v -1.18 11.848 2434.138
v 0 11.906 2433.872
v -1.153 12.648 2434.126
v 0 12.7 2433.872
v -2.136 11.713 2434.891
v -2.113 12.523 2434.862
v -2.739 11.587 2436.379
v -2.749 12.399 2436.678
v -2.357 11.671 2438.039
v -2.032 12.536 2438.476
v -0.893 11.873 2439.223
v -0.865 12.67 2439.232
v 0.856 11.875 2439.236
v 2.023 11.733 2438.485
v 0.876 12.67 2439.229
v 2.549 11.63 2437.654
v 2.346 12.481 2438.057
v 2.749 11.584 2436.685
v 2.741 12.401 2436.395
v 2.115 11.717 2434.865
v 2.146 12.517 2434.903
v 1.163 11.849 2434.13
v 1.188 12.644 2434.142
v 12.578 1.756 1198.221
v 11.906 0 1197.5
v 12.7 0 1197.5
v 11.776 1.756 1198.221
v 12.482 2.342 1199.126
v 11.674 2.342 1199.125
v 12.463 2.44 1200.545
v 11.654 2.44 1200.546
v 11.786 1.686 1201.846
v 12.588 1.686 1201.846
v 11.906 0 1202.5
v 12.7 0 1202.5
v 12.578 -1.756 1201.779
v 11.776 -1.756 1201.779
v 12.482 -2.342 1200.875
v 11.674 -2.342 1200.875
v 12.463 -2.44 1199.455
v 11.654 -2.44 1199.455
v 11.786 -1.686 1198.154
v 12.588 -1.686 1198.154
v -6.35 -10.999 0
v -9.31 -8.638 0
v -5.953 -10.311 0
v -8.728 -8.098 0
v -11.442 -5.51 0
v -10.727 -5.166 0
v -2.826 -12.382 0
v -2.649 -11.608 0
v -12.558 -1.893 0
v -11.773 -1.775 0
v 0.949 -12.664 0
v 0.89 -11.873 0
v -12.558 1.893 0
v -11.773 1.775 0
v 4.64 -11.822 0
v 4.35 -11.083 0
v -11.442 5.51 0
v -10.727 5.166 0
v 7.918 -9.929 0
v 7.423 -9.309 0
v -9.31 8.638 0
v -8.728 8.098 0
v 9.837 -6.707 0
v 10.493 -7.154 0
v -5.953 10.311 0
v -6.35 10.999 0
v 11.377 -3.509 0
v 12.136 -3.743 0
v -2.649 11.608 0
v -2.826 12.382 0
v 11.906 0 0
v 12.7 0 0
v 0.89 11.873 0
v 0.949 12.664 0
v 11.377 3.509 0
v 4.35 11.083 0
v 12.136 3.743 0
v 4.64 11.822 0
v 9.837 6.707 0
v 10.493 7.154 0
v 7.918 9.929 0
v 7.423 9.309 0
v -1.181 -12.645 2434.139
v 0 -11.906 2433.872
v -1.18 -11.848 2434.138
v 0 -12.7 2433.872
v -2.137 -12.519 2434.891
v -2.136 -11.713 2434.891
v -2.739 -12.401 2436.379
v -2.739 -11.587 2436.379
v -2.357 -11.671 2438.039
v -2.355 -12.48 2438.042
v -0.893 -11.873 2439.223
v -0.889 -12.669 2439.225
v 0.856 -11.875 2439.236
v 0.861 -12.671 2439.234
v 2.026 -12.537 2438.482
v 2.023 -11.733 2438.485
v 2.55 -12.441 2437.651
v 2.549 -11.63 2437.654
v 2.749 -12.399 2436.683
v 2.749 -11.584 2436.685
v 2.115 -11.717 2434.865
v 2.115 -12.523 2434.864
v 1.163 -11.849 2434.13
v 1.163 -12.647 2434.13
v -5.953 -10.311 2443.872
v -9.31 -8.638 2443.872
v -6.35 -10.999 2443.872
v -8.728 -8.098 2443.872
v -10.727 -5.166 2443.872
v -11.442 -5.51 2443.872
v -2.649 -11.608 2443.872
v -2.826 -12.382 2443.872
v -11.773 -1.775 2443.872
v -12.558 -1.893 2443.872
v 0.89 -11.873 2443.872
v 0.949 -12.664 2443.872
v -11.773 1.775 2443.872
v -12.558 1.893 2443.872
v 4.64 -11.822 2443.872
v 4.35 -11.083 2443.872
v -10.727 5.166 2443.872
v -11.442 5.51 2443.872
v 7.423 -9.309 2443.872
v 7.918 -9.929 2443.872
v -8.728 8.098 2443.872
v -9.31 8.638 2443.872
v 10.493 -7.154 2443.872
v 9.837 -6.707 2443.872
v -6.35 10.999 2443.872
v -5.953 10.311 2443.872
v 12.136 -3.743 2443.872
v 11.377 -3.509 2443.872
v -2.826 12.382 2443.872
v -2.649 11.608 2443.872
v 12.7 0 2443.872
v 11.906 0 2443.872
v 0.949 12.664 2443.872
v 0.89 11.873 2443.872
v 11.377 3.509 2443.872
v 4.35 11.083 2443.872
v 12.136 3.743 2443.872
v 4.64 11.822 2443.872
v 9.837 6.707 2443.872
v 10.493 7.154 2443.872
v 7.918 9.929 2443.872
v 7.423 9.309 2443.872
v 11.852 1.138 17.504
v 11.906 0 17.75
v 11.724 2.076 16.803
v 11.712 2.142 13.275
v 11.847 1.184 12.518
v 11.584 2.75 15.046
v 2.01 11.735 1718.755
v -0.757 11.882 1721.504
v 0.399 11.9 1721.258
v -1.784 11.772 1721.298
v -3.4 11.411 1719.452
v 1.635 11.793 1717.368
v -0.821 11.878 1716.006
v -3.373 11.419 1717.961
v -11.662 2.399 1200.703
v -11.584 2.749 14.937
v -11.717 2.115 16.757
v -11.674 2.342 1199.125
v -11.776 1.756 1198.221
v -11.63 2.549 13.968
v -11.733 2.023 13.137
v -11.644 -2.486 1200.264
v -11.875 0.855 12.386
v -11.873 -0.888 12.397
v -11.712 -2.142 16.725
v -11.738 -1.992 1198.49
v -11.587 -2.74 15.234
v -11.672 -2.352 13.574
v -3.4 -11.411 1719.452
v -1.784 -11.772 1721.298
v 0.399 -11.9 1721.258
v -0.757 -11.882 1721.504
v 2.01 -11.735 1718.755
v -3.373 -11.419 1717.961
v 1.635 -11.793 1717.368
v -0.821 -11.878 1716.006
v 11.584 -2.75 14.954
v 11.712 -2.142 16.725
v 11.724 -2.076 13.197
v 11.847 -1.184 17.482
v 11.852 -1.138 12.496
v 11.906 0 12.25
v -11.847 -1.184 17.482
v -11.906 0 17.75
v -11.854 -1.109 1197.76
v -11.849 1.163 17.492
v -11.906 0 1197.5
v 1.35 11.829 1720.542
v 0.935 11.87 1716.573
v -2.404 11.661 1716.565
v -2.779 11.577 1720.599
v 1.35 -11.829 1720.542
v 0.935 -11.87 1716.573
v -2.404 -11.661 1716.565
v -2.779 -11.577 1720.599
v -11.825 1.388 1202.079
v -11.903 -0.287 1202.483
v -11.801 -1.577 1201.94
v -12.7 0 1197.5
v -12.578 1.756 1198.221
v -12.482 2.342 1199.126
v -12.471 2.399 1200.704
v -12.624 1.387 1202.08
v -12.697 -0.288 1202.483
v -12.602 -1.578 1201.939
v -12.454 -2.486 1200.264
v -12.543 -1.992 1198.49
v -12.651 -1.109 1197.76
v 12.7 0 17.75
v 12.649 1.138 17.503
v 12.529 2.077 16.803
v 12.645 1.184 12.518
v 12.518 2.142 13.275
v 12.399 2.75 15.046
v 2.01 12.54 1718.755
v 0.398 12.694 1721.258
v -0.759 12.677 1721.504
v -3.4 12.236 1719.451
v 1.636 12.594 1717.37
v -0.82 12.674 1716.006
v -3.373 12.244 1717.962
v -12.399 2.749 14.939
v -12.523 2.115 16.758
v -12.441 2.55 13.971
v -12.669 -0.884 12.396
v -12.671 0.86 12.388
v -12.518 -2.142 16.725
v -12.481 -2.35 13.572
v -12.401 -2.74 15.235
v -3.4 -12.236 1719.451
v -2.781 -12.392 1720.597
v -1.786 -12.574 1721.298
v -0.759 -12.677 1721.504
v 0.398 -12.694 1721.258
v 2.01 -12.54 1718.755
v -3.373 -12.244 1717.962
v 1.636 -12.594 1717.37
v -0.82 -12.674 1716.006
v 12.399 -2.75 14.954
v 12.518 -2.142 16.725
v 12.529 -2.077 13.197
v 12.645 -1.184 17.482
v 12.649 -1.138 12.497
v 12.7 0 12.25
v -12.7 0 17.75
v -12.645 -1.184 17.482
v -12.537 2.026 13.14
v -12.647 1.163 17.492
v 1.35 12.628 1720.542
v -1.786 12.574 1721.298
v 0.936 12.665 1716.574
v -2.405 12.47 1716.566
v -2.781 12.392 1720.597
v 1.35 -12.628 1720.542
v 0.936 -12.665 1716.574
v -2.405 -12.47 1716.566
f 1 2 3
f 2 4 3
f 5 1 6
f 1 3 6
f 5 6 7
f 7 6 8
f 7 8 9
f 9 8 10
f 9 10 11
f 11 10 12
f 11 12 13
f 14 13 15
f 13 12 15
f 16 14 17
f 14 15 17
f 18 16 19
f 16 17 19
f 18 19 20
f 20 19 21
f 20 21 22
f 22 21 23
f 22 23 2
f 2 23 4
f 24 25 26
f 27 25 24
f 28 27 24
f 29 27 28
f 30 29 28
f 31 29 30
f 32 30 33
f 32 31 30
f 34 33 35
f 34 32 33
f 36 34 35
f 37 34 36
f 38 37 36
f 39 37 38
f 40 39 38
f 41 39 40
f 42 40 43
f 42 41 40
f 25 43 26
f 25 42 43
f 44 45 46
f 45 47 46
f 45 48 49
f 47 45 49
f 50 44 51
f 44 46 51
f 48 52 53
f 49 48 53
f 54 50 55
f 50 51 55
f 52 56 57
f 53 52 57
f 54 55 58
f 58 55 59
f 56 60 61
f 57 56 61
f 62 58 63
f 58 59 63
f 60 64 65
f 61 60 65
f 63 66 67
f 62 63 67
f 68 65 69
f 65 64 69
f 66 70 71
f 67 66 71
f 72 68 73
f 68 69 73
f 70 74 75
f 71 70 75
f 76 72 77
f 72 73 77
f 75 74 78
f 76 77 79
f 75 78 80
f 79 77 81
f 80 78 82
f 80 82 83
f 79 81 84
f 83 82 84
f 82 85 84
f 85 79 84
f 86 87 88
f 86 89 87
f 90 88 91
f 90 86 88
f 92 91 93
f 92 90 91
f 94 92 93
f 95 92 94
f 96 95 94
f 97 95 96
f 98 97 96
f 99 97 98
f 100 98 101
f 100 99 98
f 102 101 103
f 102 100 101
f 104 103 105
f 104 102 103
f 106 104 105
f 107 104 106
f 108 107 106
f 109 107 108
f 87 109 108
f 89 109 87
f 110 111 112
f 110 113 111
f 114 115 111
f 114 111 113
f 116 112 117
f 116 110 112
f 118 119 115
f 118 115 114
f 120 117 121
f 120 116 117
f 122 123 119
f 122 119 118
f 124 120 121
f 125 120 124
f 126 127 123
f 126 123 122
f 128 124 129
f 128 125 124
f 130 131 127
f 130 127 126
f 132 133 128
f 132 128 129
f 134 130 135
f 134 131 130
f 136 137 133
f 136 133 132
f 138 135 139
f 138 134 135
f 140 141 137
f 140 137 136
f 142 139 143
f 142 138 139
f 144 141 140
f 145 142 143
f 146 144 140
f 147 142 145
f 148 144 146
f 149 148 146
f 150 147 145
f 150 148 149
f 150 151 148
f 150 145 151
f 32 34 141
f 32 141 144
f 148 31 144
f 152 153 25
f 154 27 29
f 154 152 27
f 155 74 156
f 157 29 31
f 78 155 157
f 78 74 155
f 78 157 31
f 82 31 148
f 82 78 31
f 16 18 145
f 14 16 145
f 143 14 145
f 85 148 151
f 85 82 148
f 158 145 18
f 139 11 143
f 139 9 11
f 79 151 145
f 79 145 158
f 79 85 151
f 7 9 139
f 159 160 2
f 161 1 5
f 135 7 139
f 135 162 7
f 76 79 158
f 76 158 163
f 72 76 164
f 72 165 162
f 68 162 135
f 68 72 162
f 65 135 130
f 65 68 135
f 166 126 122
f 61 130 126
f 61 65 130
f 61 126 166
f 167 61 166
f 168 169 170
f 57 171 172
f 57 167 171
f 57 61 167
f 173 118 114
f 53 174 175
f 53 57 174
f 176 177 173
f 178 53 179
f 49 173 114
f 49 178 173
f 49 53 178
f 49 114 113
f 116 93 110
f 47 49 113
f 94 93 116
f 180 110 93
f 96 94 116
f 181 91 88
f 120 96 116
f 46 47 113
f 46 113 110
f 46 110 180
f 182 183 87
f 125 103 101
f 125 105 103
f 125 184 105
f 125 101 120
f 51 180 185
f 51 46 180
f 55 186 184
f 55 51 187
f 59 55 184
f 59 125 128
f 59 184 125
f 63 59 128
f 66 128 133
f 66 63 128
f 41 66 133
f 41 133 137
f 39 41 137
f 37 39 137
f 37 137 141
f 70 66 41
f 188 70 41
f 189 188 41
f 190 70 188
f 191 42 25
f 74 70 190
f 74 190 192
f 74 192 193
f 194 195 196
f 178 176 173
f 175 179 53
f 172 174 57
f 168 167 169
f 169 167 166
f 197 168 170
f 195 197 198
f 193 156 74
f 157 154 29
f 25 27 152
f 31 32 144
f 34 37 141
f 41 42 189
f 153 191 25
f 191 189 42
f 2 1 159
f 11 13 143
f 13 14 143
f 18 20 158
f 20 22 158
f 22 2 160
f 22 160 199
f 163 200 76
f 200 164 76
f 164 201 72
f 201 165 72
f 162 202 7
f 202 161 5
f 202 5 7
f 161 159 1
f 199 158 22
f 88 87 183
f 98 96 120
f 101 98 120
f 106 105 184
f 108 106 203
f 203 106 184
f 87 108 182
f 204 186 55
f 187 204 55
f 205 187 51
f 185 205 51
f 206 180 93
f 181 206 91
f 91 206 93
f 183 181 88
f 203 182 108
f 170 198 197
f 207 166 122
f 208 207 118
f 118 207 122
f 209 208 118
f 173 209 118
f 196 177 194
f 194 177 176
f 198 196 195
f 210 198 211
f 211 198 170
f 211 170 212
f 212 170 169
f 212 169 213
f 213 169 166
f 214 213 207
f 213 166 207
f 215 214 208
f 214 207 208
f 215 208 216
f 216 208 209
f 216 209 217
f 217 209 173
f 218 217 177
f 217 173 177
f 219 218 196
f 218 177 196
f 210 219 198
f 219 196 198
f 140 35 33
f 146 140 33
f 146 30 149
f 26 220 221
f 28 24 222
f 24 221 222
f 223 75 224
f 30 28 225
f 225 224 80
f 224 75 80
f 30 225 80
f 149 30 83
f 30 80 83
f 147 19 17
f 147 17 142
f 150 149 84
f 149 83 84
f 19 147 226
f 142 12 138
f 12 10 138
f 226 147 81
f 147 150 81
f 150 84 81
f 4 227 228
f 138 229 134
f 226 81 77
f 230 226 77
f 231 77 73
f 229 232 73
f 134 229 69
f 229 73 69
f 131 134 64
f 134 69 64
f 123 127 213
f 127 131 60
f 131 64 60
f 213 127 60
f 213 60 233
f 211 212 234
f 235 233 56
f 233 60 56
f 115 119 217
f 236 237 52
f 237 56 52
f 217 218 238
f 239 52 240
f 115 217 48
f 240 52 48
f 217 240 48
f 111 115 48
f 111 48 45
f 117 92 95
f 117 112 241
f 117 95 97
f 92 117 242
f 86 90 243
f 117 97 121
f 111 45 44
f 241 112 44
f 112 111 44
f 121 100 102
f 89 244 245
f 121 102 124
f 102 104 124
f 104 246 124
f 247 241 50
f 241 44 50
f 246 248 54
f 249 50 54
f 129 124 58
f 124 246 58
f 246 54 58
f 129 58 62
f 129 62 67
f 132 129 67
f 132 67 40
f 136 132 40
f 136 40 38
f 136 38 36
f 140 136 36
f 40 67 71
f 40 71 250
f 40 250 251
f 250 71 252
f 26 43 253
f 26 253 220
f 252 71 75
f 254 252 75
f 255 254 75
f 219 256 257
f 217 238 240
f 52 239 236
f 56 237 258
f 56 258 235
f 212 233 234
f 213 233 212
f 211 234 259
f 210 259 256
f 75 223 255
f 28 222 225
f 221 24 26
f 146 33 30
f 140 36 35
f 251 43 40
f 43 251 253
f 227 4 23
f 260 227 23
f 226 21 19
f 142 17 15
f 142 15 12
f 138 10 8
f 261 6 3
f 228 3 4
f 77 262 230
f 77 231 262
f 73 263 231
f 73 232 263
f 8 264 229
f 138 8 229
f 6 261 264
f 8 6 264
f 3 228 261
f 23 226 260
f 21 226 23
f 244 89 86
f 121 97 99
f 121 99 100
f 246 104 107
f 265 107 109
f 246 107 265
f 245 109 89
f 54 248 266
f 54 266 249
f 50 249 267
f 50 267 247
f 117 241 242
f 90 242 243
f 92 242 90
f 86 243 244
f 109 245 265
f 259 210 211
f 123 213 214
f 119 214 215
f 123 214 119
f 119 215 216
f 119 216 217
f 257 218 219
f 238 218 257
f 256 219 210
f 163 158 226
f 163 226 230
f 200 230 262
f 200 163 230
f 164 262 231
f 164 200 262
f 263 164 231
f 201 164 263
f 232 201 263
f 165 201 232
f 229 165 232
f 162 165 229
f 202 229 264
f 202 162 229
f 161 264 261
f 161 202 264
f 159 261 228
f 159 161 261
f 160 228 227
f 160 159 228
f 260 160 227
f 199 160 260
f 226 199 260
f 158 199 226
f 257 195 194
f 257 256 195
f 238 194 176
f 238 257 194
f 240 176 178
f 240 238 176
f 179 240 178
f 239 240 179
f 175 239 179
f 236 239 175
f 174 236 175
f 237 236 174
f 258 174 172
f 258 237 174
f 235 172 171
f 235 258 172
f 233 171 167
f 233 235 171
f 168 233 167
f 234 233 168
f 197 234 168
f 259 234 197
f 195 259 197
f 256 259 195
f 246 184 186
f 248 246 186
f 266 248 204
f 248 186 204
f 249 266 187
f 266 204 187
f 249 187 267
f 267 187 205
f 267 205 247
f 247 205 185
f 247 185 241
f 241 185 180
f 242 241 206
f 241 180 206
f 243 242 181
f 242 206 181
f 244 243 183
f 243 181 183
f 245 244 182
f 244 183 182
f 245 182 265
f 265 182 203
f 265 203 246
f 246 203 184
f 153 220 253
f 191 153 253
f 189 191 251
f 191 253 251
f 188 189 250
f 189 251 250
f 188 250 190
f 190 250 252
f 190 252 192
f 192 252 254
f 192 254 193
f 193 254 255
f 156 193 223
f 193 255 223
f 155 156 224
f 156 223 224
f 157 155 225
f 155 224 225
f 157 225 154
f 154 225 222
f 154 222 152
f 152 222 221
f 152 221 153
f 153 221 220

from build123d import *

# Parameters (mm, degrees)
SKETCH1_R               = 12.7
SKETCH1_R_2             = 11.90625
BOSS_EXTRUDE1_DEPTH     = 2443.872227937
SKETCH4_W               = 2.75
SKETCH4_H               = 12.7
SKETCH12_W              = 2.75
SKETCH12_H              = 12.7
SKETCH13_R              = 2.750000003
CUT_EXTRUDE1_DEPTH      = 13.7000001
CUT_EXTRUDE1_DEPTH_BACK = 13.7000001
SKETCH14_R              = 2.5
CUT_EXTRUDE2_DEPTH      = 13.7000001
CUT_EXTRUDE2_DEPTH_BACK = 13.7000001


with BuildPart() as part:
    # Sketch1 → Boss-Extrude1 (new body)
    with BuildSketch(Plane.XY):
        Circle(SKETCH1_R)
        Circle(SKETCH1_R_2, mode=Mode.SUBTRACT)
    extrude(amount=BOSS_EXTRUDE1_DEPTH)

    # Sketch4 → M5 Clearance Hole1 (revolve, cut)
    with BuildSketch(Plane(origin=(0, 0, 2436.622227937), x_dir=(0, 0, -1), z_dir=(1, 0, 0))):
        with Locations((1.375, 6.35)):
            Rectangle(SKETCH4_W, SKETCH4_H)
    m5_clearance_hole1 = revolve(axis=Axis((0, -6.35, 2436.622227937), (0, 1, 0)), mode=Mode.SUBTRACT)

    # Mirror1: M5 Clearance Hole1 across plane
    add(m5_clearance_hole1.mirror(Plane.ZX), mode=Mode.SUBTRACT)

    # Sketch12 → M5 Clearance Hole3 (revolve, cut)
    with BuildSketch(Plane(origin=(0, 0, 15), x_dir=(0, 0, 1), z_dir=(0, 1, 0))):
        with Locations((1.375, 6.35)):
            Rectangle(SKETCH12_W, SKETCH12_H)
    m5_clearance_hole3 = revolve(axis=Axis((-6.35, 0, 15), (1, 0, 0)), mode=Mode.SUBTRACT)

    # Mirror3: M5 Clearance Hole3 across plane
    add(m5_clearance_hole3.mirror(Plane(origin=(0, 0, 0), x_dir=(0, 0, 1), z_dir=(1, 0, 0))), mode=Mode.SUBTRACT)

    # Sketch13 → Cut-Extrude1 (cut, two sides)
    with BuildSketch(Plane(origin=(0, 0, 0), x_dir=(1, 0, 0), z_dir=(0, 1, 0))) as cut_extrude1_sk:
        with Locations((-0.739798723, -1718.754532743)):
            Circle(SKETCH13_R)
    extrude(amount=CUT_EXTRUDE1_DEPTH, mode=Mode.SUBTRACT)
    extrude(cut_extrude1_sk.sketch, amount=-CUT_EXTRUDE1_DEPTH_BACK, mode=Mode.SUBTRACT)

    # Sketch14 → Cut-Extrude2 (cut, two sides)
    with BuildSketch(Plane(origin=(0, 0, 0), x_dir=(0, 0, -1), z_dir=(1, 0, 0))) as cut_extrude2_sk:
        with Locations((-1200, 0)):
            Circle(SKETCH14_R)
    extrude(amount=CUT_EXTRUDE2_DEPTH, mode=Mode.SUBTRACT)
    extrude(cut_extrude2_sk.sketch, amount=-CUT_EXTRUDE2_DEPTH_BACK, mode=Mode.SUBTRACT)


solid = part.part
